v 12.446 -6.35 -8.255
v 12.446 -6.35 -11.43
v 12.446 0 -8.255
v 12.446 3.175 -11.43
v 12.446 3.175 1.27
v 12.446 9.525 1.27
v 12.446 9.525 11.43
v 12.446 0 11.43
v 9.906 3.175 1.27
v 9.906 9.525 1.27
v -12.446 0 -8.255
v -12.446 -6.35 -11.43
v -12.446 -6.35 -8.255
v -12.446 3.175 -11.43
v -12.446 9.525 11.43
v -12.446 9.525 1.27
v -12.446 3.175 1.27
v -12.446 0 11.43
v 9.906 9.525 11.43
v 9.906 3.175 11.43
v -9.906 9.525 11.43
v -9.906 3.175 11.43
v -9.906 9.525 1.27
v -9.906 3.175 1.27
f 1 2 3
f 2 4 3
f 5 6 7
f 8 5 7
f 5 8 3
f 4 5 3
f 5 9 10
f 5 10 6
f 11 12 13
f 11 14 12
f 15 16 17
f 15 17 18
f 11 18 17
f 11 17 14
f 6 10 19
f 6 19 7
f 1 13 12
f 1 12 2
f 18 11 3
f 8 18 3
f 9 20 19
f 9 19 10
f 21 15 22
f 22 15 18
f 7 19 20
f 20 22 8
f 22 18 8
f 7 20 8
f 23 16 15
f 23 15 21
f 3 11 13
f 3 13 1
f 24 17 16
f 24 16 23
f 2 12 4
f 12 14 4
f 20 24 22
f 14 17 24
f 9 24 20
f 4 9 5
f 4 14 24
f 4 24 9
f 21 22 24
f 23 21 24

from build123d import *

# Parameters (mm, degrees)
SKETCH2_W           = 24.892
SKETCH2_H           = 22.86
BOSS_EXTRUDE1_DEPTH = 3.175
SKETCH3_W           = 2.54
SKETCH3_H           = 10.16
BOSS_EXTRUDE2_DEPTH = 6.35
SKETCH4_W           = 24.892
SKETCH4_H           = 3.175
BOSS_EXTRUDE3_DEPTH = 6.35


with BuildPart() as part:
    # Sketch2 → Boss-Extrude1 (new body)
    with BuildSketch(Plane(origin=(0, 0, 0), x_dir=(1, 0, 0), z_dir=(0, 1, 0))):
        Rectangle(SKETCH2_W, SKETCH2_H)
    extrude(amount=BOSS_EXTRUDE1_DEPTH)

    # Sketch3 → Boss-Extrude2 (add)
    with BuildSketch(Plane(origin=(0, 3.175, 0), x_dir=(1, 0, 0), z_dir=(0, 1, 0))):
        with Locations((11.176, -6.35)):
            Rectangle(SKETCH3_W, SKETCH3_H)
        with Locations((-11.176, -6.35)):
            Rectangle(SKETCH3_W, SKETCH3_H)
    extrude(amount=BOSS_EXTRUDE2_DEPTH)

    # Sketch4 → Boss-Extrude3 (add)
    with BuildSketch(Plane.XZ):
        with Locations((0, -9.8425)):
            Rectangle(SKETCH4_W, SKETCH4_H)
    extrude(amount=BOSS_EXTRUDE3_DEPTH)


solid = part.part
